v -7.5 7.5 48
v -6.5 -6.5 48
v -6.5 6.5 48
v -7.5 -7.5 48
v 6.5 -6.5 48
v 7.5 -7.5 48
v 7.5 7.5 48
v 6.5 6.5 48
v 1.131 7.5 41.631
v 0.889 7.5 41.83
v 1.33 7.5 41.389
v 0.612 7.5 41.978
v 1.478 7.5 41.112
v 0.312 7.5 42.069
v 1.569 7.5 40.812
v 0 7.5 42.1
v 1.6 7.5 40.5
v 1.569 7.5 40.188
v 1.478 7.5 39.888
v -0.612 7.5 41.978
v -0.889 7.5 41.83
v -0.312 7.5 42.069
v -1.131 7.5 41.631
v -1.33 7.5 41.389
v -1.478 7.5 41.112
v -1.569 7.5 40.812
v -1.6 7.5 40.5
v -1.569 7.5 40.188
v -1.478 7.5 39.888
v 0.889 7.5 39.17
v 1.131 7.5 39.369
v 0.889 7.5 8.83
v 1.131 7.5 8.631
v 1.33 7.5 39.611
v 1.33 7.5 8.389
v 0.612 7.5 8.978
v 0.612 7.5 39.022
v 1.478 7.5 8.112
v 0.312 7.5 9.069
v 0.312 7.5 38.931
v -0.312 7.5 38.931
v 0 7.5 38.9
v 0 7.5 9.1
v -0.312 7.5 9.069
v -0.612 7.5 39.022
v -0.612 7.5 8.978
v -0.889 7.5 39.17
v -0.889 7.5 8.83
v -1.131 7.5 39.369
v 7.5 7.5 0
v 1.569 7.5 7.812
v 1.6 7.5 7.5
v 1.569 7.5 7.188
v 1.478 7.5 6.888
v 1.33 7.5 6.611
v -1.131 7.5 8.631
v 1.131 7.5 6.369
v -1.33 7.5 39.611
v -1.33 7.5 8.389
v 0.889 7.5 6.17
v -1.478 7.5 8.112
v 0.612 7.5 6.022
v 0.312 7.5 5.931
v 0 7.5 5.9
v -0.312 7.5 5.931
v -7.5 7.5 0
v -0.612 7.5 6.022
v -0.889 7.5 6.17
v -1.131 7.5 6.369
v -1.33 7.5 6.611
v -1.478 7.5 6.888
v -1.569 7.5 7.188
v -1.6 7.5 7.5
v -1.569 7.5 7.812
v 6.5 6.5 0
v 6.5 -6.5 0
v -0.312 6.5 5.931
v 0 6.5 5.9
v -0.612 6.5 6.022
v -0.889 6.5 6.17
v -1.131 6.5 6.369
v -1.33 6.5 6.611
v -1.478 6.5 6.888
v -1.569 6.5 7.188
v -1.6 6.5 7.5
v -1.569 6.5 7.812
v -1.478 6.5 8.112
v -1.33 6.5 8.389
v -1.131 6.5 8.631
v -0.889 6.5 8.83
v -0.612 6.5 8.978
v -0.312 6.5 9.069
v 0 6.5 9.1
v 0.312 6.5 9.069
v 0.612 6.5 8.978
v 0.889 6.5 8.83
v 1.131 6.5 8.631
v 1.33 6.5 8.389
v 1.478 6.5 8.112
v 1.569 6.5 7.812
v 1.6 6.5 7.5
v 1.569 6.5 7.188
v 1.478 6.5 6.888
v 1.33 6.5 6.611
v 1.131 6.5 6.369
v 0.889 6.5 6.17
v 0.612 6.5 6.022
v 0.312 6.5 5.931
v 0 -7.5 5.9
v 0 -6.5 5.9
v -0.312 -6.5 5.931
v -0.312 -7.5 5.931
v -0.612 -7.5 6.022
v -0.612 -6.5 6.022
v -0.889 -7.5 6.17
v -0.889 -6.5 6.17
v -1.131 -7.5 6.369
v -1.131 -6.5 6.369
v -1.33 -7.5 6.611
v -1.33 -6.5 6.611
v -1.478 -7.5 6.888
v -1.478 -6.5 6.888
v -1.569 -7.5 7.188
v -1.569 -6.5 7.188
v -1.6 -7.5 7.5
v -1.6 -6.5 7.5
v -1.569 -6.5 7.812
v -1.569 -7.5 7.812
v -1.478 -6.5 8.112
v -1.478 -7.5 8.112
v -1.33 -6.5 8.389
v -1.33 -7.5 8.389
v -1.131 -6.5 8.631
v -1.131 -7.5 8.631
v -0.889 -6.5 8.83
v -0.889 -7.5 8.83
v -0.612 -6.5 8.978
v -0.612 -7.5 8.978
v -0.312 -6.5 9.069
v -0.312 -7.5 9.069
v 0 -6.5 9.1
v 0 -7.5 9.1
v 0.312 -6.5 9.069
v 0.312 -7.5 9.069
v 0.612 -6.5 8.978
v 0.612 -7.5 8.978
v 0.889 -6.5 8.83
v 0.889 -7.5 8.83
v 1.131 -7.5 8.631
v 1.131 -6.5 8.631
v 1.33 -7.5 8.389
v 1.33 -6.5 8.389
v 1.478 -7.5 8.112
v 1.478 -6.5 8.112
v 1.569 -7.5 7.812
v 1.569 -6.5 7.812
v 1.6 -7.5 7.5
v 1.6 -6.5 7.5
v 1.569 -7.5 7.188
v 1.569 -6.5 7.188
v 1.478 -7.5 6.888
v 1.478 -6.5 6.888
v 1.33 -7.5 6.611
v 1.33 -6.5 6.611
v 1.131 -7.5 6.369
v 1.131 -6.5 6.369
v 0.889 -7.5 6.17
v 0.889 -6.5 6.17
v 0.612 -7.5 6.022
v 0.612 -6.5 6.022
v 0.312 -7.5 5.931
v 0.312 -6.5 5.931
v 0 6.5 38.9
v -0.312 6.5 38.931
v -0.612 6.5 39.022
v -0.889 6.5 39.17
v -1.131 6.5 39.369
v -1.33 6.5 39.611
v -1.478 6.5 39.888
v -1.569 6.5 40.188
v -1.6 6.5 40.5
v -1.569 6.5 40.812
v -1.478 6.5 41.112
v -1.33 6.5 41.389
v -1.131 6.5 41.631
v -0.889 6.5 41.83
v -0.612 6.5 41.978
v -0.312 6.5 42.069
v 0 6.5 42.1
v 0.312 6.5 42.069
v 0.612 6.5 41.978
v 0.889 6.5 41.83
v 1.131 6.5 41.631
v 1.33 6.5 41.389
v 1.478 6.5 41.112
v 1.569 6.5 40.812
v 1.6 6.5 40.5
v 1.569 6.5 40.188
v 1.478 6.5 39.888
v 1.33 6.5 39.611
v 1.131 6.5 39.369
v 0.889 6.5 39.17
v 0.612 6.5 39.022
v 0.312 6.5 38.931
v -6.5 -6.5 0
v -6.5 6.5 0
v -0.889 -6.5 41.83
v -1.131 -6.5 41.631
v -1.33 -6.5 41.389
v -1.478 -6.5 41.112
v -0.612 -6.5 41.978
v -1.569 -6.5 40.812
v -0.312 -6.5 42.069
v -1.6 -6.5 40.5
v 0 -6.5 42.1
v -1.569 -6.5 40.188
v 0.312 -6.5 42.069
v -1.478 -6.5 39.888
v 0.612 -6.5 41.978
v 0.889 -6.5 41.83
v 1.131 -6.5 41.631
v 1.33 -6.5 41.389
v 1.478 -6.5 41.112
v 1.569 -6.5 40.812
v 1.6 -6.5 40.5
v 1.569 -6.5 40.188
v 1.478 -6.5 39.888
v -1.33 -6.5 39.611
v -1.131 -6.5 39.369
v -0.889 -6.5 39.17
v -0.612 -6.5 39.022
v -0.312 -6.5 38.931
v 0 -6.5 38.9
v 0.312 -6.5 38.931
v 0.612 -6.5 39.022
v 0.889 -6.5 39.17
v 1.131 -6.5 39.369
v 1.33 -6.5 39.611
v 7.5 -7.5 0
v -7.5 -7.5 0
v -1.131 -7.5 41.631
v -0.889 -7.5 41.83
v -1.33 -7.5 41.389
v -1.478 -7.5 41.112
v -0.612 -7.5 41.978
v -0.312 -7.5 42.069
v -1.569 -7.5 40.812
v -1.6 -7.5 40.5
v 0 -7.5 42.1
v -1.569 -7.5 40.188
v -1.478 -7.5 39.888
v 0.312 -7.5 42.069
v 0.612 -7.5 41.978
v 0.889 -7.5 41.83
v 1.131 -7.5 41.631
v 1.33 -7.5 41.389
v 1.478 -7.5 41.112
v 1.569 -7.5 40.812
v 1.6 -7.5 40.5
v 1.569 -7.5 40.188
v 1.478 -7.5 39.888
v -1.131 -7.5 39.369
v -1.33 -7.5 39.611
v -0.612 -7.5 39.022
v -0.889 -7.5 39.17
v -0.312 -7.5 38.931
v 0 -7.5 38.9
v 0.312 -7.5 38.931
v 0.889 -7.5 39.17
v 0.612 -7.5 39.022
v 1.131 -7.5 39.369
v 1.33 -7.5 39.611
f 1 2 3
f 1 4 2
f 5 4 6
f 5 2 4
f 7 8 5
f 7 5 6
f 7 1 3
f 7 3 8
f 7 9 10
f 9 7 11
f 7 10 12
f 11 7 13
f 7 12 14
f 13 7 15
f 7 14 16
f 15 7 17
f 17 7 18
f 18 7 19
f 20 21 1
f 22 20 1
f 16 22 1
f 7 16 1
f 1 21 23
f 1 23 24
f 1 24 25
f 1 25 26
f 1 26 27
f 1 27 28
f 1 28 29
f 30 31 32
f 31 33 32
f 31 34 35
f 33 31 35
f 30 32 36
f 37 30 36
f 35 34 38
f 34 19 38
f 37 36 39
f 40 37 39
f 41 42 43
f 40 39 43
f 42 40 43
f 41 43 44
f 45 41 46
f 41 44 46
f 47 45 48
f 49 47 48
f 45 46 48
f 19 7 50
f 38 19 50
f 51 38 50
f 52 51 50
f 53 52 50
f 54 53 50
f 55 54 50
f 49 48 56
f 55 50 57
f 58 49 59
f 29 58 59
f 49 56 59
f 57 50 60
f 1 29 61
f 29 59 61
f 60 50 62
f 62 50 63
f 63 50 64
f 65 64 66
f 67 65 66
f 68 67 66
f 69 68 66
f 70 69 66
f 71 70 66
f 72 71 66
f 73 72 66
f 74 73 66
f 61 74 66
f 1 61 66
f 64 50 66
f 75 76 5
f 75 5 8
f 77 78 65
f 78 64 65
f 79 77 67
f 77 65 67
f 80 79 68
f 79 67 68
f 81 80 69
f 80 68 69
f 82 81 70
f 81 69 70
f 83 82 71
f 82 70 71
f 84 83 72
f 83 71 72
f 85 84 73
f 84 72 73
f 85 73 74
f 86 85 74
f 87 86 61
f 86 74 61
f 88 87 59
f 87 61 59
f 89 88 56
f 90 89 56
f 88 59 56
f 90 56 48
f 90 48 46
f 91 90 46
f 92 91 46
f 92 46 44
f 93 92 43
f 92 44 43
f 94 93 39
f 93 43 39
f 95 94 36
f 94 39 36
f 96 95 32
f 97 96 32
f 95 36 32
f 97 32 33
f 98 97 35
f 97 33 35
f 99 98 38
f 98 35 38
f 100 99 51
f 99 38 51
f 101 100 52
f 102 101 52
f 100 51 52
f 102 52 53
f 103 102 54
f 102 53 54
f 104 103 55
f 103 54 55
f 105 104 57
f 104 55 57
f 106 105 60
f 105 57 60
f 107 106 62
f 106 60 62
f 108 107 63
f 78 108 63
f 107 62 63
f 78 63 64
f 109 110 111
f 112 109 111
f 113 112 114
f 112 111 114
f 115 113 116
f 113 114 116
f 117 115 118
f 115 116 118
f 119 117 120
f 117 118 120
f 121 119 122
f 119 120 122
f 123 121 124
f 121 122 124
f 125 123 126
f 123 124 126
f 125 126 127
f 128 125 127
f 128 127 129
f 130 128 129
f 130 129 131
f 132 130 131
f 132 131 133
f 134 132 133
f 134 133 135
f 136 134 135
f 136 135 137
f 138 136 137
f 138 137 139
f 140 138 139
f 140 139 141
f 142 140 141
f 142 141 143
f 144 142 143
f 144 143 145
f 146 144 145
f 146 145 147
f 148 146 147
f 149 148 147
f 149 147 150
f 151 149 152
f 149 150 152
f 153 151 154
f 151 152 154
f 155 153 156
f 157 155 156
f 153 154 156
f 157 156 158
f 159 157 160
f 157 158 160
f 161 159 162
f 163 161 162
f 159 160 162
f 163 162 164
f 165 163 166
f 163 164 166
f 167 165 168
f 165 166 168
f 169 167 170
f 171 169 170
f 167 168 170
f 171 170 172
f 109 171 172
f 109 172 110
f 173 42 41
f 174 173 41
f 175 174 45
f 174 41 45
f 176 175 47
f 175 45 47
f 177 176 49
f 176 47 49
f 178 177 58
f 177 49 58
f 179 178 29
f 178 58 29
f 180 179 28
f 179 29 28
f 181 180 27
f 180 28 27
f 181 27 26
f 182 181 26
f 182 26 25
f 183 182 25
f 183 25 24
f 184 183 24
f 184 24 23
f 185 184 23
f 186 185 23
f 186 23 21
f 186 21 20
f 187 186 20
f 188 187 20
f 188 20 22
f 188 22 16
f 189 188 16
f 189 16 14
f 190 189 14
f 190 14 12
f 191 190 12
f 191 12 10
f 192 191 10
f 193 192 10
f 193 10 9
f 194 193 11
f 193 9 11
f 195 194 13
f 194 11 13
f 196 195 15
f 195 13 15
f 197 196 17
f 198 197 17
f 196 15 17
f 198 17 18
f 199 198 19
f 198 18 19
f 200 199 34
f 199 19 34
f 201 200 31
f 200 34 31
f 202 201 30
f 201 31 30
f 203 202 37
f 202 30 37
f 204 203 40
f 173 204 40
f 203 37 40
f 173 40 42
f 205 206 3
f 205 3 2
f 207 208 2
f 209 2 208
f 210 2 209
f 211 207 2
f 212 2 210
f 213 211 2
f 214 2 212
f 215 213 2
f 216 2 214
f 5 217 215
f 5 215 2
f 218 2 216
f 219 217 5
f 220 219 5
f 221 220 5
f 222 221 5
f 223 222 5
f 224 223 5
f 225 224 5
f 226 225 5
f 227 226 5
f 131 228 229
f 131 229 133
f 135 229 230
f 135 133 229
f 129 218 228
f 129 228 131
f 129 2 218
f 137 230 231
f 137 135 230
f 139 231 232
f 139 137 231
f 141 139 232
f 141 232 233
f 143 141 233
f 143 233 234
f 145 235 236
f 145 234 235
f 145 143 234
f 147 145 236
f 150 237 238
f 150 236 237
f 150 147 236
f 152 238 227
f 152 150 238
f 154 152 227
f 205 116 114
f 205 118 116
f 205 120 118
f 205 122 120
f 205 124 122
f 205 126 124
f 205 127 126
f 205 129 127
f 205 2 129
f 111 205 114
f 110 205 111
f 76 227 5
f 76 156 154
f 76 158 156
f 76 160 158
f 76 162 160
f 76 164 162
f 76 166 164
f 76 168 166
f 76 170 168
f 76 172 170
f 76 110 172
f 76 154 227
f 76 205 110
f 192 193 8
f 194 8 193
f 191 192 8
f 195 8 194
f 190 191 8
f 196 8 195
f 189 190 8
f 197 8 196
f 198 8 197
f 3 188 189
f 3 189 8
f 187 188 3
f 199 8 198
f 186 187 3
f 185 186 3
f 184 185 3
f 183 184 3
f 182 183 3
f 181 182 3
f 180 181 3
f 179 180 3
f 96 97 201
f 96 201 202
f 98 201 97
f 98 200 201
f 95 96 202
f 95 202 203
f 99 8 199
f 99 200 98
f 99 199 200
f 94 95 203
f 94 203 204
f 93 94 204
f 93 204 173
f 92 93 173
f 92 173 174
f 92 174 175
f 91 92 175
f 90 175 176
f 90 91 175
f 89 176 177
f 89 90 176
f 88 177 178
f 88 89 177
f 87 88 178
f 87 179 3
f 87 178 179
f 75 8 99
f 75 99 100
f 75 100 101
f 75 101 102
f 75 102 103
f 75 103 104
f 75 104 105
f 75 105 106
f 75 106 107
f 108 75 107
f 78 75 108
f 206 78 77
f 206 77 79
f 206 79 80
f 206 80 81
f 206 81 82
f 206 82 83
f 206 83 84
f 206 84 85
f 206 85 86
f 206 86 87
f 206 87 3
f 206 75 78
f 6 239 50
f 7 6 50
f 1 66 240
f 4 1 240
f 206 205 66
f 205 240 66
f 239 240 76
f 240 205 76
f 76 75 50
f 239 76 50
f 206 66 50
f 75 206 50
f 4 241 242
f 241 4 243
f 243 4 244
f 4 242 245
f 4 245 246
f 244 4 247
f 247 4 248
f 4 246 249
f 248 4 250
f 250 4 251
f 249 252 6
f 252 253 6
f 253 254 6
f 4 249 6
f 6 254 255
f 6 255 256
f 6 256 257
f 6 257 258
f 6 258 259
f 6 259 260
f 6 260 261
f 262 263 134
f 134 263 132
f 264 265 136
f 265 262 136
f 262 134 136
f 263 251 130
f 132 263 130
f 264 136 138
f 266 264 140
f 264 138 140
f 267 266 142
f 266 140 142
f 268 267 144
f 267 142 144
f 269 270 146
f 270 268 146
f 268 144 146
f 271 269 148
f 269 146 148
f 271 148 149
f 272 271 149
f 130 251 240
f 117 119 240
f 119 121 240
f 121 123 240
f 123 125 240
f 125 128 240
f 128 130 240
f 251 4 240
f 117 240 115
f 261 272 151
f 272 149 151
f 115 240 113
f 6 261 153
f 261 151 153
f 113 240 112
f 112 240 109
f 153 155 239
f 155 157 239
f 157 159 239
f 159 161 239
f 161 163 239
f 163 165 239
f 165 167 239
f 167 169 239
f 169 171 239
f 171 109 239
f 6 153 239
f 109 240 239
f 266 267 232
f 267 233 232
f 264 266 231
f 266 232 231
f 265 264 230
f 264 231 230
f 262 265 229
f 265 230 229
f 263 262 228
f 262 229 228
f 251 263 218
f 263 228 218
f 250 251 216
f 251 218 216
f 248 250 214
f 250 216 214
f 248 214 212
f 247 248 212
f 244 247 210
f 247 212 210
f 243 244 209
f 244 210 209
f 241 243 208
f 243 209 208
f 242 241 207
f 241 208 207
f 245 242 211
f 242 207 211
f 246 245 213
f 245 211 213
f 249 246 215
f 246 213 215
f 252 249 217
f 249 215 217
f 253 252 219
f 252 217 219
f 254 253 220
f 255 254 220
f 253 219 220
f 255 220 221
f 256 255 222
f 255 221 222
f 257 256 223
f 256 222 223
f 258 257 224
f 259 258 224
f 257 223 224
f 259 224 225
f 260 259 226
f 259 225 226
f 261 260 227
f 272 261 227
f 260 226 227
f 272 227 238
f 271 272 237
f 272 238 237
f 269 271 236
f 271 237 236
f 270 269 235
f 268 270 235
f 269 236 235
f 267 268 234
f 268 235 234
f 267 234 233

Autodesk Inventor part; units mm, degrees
ref_plane "YZ Plane" through (0, 0, 0) normal (1, 0, 0) x (0, 1, 0)
ref_plane "XZ Plane" through (0, 0, 0) normal (0, 1, 0) x (-1, 0, 0)
ref_plane "XY Plane" through (0, 0, 0) normal (0, 0, 1) x (1, 0, 0)
sketch "スケッチ1" plane through (0, 0, 0) normal (0, 0, 1) x (1, 0, 0)
  line L0 (-7.5, -7.5) -> (7.5, -7.5)
  line L1 (7.5, -7.5) -> (7.5, 7.5)
  line L2 (7.5, 7.5) -> (-7.5, 7.5)
  line L3 (-7.5, 7.5) -> (-7.5, -7.5)
  line L4 (-7.5, -7.5) -> (7.5, 7.5) construction
  line L5 (7.5, -7.5) -> (-7.5, 7.5) construction
  point P0 (0, 0)
  dimension "d0" = 15
  dimension "d1" = 15
extrude "押し出し1" add sketch "スケッチ1" along normal blind 48
shell "シェル1" thickness 1 removed faces 2 at (-2.5, 2.5, 0) at (-2.5, 2.5, 48)
sketch "スケッチ2" plane through (-7.5, -7.5, 0) normal (0, -1, 0) x (1, 0, 0)
  line L0 (0, 0) -> (15, 0) projected
  point P0 (7.5, 0)
  point P1 (7.5, 7.5)
  point P2 (7.5, 0)
  point P3 (7.5, 40.5)
  point P4 (7.5, 0)
  dimension "d5" = 7.5
  dimension "d13" = 33
hole "穴1" at (0, -7.5, 7.5) at (0, -7.5, 40.5) direction (0, 1, 0) diameter 3.2 end through all
properties part number "SlideHOLDsq"
